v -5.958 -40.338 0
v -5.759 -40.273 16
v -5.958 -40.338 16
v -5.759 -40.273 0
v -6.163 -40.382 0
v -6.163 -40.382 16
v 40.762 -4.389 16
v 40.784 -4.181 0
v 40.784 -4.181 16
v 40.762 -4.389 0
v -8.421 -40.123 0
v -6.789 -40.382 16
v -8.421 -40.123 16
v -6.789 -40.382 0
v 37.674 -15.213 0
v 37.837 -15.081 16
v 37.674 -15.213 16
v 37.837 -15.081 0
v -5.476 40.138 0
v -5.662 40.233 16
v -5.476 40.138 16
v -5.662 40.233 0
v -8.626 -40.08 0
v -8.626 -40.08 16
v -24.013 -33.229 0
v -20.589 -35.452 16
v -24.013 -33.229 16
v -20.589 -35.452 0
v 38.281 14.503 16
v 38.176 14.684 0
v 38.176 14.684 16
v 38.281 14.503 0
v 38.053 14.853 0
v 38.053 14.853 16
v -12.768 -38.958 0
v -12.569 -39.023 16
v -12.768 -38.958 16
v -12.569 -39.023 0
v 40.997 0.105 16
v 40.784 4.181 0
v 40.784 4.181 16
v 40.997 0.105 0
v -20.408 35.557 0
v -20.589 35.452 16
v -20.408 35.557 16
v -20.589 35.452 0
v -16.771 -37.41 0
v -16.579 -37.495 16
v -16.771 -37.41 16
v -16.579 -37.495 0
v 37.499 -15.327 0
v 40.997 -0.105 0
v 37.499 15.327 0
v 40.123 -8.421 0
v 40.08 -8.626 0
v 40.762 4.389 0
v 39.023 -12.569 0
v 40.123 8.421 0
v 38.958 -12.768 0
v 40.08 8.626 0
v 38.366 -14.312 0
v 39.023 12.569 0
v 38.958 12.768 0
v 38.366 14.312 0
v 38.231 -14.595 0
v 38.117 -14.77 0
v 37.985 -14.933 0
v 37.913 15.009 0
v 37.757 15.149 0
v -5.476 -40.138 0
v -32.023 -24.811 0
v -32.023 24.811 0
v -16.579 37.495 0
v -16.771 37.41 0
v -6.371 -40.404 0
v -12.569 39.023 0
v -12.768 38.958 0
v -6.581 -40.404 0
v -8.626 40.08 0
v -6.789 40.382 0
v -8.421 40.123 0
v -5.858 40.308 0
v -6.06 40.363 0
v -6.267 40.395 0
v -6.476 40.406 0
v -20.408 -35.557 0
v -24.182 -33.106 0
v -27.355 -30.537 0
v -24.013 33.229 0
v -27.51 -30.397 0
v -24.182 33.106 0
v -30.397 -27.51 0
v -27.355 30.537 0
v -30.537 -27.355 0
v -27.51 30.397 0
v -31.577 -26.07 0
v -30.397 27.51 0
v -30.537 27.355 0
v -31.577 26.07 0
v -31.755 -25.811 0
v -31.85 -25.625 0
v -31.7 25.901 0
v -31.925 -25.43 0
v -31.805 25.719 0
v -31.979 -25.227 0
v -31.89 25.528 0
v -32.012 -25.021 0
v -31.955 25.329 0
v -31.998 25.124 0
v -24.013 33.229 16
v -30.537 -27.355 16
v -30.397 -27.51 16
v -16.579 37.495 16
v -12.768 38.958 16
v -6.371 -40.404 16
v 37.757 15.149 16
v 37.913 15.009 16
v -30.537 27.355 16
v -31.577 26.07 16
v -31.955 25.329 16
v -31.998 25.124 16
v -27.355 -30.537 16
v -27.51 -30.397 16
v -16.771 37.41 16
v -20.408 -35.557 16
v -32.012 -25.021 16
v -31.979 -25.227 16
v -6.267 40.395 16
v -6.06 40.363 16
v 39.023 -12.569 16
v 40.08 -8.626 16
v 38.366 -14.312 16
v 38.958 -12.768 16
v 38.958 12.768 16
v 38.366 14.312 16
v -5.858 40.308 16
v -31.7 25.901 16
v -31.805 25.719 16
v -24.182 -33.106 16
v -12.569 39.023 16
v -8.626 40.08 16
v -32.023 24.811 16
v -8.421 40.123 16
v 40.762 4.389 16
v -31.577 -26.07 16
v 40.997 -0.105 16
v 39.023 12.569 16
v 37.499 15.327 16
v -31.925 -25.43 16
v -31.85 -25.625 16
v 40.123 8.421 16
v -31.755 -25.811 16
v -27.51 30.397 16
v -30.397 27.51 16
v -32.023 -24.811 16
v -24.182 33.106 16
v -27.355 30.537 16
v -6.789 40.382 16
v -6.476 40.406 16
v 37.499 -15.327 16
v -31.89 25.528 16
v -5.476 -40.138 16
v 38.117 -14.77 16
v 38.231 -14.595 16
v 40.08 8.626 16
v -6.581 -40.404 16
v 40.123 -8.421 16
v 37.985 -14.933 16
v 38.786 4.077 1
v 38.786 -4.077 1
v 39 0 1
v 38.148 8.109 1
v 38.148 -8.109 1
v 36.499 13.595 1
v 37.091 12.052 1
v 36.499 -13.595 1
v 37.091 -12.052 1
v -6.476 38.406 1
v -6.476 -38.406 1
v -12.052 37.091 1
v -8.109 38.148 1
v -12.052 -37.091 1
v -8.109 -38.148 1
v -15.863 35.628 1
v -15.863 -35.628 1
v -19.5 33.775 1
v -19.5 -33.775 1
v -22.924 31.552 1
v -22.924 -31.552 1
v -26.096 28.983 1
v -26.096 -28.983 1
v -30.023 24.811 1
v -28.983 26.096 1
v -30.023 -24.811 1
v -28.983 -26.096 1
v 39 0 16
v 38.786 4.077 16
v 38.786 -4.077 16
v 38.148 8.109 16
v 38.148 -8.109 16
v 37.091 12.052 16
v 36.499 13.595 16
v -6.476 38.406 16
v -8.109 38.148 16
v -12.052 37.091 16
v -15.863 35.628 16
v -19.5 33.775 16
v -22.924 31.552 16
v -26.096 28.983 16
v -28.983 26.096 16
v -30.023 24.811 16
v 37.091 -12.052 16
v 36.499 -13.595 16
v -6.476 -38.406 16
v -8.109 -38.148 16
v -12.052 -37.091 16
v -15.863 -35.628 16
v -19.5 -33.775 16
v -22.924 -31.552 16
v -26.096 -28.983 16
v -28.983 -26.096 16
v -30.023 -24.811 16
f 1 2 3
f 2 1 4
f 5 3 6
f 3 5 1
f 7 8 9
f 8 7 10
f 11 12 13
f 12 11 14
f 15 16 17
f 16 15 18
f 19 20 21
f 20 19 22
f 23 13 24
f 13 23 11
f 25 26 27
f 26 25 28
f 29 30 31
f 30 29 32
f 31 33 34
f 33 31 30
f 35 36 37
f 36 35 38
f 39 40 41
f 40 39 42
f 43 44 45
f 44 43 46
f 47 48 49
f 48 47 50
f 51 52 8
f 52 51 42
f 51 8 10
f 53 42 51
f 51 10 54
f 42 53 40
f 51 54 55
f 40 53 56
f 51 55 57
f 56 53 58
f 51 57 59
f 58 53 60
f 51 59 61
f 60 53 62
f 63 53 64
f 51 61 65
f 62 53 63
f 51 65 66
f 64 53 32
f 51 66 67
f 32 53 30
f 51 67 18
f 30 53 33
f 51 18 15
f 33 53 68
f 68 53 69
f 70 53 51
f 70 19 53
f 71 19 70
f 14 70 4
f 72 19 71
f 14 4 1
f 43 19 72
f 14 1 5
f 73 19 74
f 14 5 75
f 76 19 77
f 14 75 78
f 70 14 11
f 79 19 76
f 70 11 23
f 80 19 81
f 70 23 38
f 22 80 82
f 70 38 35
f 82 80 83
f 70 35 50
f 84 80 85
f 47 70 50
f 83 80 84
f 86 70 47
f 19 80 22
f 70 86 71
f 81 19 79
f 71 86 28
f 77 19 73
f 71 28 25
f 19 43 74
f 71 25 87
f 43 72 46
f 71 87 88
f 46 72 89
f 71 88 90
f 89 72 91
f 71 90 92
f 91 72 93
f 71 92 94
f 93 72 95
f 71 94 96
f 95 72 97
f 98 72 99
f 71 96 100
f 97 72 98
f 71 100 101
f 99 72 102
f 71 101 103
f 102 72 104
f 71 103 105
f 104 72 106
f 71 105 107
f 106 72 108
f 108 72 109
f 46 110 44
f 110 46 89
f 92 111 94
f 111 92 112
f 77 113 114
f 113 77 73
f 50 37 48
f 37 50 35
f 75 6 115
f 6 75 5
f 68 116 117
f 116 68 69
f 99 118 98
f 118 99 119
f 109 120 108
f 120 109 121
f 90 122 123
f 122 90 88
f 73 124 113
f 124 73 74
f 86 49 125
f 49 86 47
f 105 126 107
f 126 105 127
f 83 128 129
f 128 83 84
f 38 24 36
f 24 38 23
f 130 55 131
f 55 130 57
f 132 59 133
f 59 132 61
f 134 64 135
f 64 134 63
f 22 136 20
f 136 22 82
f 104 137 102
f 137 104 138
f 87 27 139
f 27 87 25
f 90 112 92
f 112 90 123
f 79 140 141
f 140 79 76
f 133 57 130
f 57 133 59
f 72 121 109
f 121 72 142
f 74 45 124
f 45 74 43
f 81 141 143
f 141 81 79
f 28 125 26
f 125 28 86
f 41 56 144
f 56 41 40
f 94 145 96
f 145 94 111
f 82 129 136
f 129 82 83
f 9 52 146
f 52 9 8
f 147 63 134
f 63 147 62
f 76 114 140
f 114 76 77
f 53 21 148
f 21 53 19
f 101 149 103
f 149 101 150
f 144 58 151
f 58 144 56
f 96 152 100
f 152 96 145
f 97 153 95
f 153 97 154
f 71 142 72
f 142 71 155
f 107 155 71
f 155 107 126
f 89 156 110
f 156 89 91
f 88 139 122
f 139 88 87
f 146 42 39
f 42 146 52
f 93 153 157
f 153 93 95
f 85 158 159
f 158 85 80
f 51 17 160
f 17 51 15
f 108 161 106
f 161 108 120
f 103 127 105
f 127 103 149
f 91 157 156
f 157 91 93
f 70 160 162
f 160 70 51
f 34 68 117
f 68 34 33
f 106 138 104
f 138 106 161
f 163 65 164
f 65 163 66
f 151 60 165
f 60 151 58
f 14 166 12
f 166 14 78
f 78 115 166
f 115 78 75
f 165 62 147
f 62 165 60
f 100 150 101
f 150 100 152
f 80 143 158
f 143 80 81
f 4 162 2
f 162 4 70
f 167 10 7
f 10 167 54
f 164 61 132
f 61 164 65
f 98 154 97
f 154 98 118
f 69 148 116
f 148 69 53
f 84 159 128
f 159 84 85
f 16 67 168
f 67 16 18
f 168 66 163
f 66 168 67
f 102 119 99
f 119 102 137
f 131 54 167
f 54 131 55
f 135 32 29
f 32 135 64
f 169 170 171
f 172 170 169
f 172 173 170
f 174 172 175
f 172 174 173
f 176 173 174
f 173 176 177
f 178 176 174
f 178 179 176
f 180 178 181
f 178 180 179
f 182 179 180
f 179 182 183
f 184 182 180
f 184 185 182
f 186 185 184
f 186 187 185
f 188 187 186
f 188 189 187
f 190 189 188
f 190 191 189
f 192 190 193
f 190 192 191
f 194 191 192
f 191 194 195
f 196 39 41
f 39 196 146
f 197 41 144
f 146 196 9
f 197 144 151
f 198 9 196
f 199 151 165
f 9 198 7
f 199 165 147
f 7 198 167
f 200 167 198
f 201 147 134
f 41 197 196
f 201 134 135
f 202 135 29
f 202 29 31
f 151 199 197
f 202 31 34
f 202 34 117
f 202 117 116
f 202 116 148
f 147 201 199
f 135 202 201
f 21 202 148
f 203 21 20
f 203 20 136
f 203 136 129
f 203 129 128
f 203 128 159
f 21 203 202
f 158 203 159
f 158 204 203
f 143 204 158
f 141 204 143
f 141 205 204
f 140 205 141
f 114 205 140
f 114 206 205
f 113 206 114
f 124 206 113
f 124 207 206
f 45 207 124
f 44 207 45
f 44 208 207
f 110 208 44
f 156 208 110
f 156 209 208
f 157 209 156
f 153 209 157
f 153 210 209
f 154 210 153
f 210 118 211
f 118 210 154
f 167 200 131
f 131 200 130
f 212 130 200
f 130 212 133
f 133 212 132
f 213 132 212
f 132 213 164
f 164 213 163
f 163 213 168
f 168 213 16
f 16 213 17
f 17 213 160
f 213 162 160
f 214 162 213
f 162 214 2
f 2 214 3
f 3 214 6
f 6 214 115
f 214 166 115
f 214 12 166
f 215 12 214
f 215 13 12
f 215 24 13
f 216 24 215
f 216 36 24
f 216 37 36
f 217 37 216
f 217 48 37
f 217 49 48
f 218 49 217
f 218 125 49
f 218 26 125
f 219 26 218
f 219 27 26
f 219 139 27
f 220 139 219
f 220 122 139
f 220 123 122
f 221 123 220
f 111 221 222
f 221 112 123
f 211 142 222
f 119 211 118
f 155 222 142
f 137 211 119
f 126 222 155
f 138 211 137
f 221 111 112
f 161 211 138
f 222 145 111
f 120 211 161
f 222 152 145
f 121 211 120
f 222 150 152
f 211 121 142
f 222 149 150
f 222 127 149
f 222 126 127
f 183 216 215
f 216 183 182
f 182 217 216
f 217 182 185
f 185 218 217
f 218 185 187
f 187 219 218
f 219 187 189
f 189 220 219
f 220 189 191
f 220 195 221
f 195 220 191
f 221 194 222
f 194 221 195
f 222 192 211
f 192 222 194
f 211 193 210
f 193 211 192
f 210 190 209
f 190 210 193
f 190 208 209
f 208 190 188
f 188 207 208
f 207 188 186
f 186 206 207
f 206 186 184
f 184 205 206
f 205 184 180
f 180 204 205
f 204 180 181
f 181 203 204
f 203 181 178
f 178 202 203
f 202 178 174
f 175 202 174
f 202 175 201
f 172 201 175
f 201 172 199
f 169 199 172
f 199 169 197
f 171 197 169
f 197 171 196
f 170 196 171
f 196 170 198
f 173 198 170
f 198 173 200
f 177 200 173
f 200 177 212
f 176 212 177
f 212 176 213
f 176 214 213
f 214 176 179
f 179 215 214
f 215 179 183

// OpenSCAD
$fn = 60;

triangle_side = 104;
limit_radius = 39;

module speaker_cavity_2d() {
  intersection() {
    circle(limit_radius);
    hull()
      for (a = [0, 120, 240])
        rotate([0, 0, a])
          translate([triangle_side * sqrt(3) / 3, 0])
            square(0.001, center=true);
  }
}

wall = 2;
flor = 1;

linear_extrude(flor)
offset(wall) speaker_cavity_2d();

translate([0, 0, flor])
linear_extrude(15)
difference() {
  offset(wall) speaker_cavity_2d();
  speaker_cavity_2d();
}
